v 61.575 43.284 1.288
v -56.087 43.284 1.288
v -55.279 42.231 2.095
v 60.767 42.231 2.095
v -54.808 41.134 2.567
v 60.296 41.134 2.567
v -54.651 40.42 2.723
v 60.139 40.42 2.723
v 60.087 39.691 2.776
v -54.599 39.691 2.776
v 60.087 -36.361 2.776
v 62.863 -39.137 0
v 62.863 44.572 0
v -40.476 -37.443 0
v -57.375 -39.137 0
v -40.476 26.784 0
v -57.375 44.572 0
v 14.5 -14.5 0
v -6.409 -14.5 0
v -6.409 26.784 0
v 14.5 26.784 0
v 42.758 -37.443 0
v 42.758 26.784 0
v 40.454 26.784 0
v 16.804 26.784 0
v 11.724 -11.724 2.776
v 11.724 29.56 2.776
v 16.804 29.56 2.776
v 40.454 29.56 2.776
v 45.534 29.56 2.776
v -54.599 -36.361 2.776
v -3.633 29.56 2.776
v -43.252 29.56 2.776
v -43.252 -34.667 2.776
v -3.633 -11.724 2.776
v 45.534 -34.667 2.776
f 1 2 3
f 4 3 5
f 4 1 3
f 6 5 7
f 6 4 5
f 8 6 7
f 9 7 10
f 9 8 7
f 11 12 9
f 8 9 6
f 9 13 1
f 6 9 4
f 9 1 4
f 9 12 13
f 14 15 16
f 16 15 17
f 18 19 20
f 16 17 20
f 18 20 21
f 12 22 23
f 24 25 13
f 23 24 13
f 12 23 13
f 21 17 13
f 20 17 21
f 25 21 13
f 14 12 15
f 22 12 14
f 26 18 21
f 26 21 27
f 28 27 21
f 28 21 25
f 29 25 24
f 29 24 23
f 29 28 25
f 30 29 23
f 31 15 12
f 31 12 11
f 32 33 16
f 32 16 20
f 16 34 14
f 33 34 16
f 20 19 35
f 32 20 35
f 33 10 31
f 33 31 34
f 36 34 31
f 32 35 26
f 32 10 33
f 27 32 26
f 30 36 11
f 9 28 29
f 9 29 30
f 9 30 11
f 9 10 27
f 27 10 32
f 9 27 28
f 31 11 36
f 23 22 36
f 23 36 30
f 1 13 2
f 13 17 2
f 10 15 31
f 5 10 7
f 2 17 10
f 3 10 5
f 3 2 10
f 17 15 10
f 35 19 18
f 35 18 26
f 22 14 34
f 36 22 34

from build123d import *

# Parameters (mm, degrees)
F0_W         = 124.8456425965
F0_H         = 88.3170031011
F1_DEPTH     = 2.7760323137
F2_T1_DEPTH  = 114.4453022588
F3_T1_DEPTH  = 145.8939417542
F4_T1_DEPTH  = 109.3653022588
F5_T1_DEPTH  = 140.8139417542
F6_R         = 5.08
F7_T1_DEPTH  = 56.8432509899
F8_T1_DEPTH  = 23.6501246691
F9_T4_DEPTH  = 47.6030598057
F10_T4_DEPTH = 72.4922642685
F11_T4_DEPTH = 72.4922642685
F12_T4_DEPTH = 74.9874005688
F13_T1_DEPTH = 41.4855244232
F14_T4_DEPTH = 109.3624946917


# Not quite as in the source:
# - a fillet or chamfer that OpenCascade refuses, or shapes differently, is made with other operations: its cross-section is extruded or revolved along the edge and cut away or added


with BuildPart() as f1:
    # F0 (on Top) → F1 (new body)
    with BuildSketch(Plane.XY):
        with Locations((2.7440618724, 2.717172727)):
            Rectangle(F0_W, F0_H)
        Polygon((-38.1721407175, -32.3632955551), (-38.1721407175, 24.4799554348), (-8.7132304907, 24.4799554348), (-8.7132304907, -16.804009676), (16.8039947748, -16.804009676), (16.8039947748, 24.4799554348), (40.4541194439, 24.4799554348), (40.4541194439, -32.3632955551), align=None, mode=Mode.SUBTRACT)
    extrude(amount=F1_DEPTH)

    # F2: chamfer of 5.08 on 1 edges, made by hand

    # F2_s2 → F2_t1 (cut)
    with BuildSketch(Plane.XZ.offset(-59.9398238564)):
        Polygon((65.1668831706, -2.3039676863), (60.0868831706, 2.7760323137), (65.1668831706, 2.7760323137), align=None)
    extrude(amount=F2_T1_DEPTH, mode=Mode.SUBTRACT)

    # F3: chamfer of 5.08 on 1 edges, made by hand

    # F3_s2 → F3_t1 (cut)
    with BuildSketch(Plane.YZ.offset(-72.7429090047)):
        Polygon((46.8756742775, -2.3039676863), (41.7956742775, 2.7760323137), (46.8756742775, 2.7760323137), align=None)
    extrude(amount=F3_T1_DEPTH, mode=Mode.SUBTRACT)

    # F4: chamfer of 5.08 on 1 edges, made by hand

    # F4_s2 → F4_t1 (cut)
    with BuildSketch(Plane.XZ.offset(-54.8598238564)):
        Polygon((-59.6787594259, -2.3039676863), (-54.5987594259, 2.7760323137), (-59.6787594259, 2.7760323137), align=None)
    extrude(amount=F4_T1_DEPTH, mode=Mode.SUBTRACT)

    # F5: chamfer of 5.08 on 1 edges, made by hand

    # F5_s2 → F5_t1 (cut)
    with BuildSketch(Plane.YZ.offset(-67.6629090048)):
        Polygon((-41.4413288236, -2.3039676863), (-36.3613288236, 2.7760323137), (-41.4413288236, 2.7760323137), align=None)
    extrude(amount=F5_T1_DEPTH, mode=Mode.SUBTRACT)

    # F6
    f6_edges = [f1.edges().sort_by_distance(p)[0] for p in [
        (2.744062, 41.795674, 2.776032),
    ]]
    fillet(f6_edges, radius=F6_R)

    # F7: chamfer of 5.08 on 1 edges, made by hand

    # F7_s2 → F7_t1 (cut)
    with BuildSketch(Plane.XZ.offset(-24.4799554348)):
        Polygon((-43.2521407175, 2.7760323137), (-38.1721407175, -2.3039676863), (-38.1721407175, 2.7760323137), align=None)
    extrude(amount=F7_T1_DEPTH, mode=Mode.SUBTRACT)

    # F8: chamfer of 5.08 on 1 edges, made by hand

    # F8_s2 → F8_t1 (cut)
    with BuildSketch(Plane.YZ.offset(16.8039947748)):
        Polygon((24.4799554348, -2.3039676863), (29.5599554348, 2.7760323137), (24.4799554348, 2.7760323137), align=None)
    extrude(amount=F8_T1_DEPTH, mode=Mode.SUBTRACT)

    # F9: chamfer of 5.08 on 1 edges, made by hand


with BuildPart() as f9_tool2:
    # F9_s3 → F9_t4 (new body)
    with BuildSketch(Plane.YZ.offset(-56.3162902964)):
        Polygon((24.4799554348, -2.3039676863), (29.5599554348, 2.7760323137), (24.4799554348, 2.7760323137), align=None)
    extrude(amount=F9_T4_DEPTH)

    split(bisect_by=Plane(origin=(-20.2380542019, 0, -20.2380542019), x_dir=(0, 1, 0), z_dir=(0.7071067812, 0, 0.7071067812)), keep=Keep.TOP)


with BuildPart() as f1_1:
    add(f1.part)

    # F9_t1: cut F9_tool2
    add(f9_tool2.part, mode=Mode.SUBTRACT)

    # F10: chamfer of 5.08 on 1 edges, made by hand


with BuildPart() as f10_tool2:
    # F10_s3 → F10_t4 (new body)
    with BuildSketch(Plane.XZ.offset(-42.6241050137)):
        Polygon((-8.7132304907, -2.3039676863), (-3.6332304907, 2.7760323137), (-8.7132304907, 2.7760323137), align=None)
    extrude(amount=F10_T4_DEPTH)

    split(bisect_by=Plane(origin=(0, 13.3919615606, -13.3919615605), x_dir=(1, 0, 0), z_dir=(0, -0.7071067812, 0.7071067812)), keep=Keep.TOP)


with BuildPart() as f1_2:
    add(f1_1.part)

    # F10_t1: cut F10_tool2
    add(f10_tool2.part, mode=Mode.SUBTRACT)

    # F11: chamfer of 5.08 on 1 edges, made by hand


with BuildPart() as f11_tool2:
    # F11_s3 → F11_t4 (new body)
    with BuildSketch(Plane.XZ.offset(29.8681592548)):
        Polygon((16.8039947748, -2.3039676863), (11.7239947748, 2.7760323137), (16.8039947748, 2.7760323137), align=None)
    extrude(amount=-F11_T4_DEPTH)

    split(bisect_by=Plane(origin=(0, 13.3919615606, -13.3919615606), x_dir=(1, 0, 0), z_dir=(0, -0.7071067812, 0.7071067812)), keep=Keep.TOP)


with BuildPart() as f1_3:
    add(f1_2.part)

    # F11_t1: cut F11_tool2
    add(f11_tool2.part, mode=Mode.SUBTRACT)

    # F12: chamfer of 5.08 on 1 edges, made by hand


with BuildPart() as f12_tool2:
    # F12_s3 → F12_t4 (new body)
    with BuildSketch(Plane.XZ.offset(-42.6241050137)):
        Polygon((40.4541194439, -2.3039676863), (45.5341194439, 2.7760323137), (40.4541194439, 2.7760323137), align=None)
    extrude(amount=F12_T4_DEPTH)

    split(bisect_by=Plane(origin=(0, 13.3919615606, -13.3919615606), x_dir=(1, 0, 0), z_dir=(0, -0.7071067812, 0.7071067812)), keep=Keep.TOP)


with BuildPart() as f1_4:
    add(f1_3.part)

    # F12_t1: cut F12_tool2
    add(f12_tool2.part, mode=Mode.SUBTRACT)

    # F13: chamfer of 5.08 on 1 edges, made by hand

    # F13_s2 → F13_t1 (cut)
    with BuildSketch(Plane.YZ.offset(-16.6973800696)):
        Polygon((-16.804009676, -2.3039676863), (-11.724009676, 2.7760323137), (-16.804009676, 2.7760323137), align=None)
    extrude(amount=F13_T1_DEPTH, mode=Mode.SUBTRACT)

    # F14: chamfer of 5.08 on 1 edges, made by hand


with BuildPart() as f14_tool2:
    # F14_s3 → F14_t4 (new body)
    with BuildSketch(Plane.YZ.offset(-53.5402579827)):
        Polygon((-37.4432955551, 0), (-32.3632955551, 5.08), (-32.3632955551, 0), align=None)
    extrude(amount=F14_T4_DEPTH)

    split(bisect_by=Plane(origin=(-20.2380542019, 0, -20.2380542019), x_dir=(0, 1, 0), z_dir=(0.7071067812, 0, 0.7071067812)), keep=Keep.TOP)

    split(bisect_by=Plane(origin=(21.3790435651, 0, -21.3790435651), x_dir=(0, 1, 0), z_dir=(-0.7071067812, 0, 0.7071067812)), keep=Keep.TOP)


with BuildPart() as f1_5:
    add(f1_4.part)

    # F14_t1: cut F14_tool2
    add(f14_tool2.part, mode=Mode.SUBTRACT)


solid = f1_5.part
